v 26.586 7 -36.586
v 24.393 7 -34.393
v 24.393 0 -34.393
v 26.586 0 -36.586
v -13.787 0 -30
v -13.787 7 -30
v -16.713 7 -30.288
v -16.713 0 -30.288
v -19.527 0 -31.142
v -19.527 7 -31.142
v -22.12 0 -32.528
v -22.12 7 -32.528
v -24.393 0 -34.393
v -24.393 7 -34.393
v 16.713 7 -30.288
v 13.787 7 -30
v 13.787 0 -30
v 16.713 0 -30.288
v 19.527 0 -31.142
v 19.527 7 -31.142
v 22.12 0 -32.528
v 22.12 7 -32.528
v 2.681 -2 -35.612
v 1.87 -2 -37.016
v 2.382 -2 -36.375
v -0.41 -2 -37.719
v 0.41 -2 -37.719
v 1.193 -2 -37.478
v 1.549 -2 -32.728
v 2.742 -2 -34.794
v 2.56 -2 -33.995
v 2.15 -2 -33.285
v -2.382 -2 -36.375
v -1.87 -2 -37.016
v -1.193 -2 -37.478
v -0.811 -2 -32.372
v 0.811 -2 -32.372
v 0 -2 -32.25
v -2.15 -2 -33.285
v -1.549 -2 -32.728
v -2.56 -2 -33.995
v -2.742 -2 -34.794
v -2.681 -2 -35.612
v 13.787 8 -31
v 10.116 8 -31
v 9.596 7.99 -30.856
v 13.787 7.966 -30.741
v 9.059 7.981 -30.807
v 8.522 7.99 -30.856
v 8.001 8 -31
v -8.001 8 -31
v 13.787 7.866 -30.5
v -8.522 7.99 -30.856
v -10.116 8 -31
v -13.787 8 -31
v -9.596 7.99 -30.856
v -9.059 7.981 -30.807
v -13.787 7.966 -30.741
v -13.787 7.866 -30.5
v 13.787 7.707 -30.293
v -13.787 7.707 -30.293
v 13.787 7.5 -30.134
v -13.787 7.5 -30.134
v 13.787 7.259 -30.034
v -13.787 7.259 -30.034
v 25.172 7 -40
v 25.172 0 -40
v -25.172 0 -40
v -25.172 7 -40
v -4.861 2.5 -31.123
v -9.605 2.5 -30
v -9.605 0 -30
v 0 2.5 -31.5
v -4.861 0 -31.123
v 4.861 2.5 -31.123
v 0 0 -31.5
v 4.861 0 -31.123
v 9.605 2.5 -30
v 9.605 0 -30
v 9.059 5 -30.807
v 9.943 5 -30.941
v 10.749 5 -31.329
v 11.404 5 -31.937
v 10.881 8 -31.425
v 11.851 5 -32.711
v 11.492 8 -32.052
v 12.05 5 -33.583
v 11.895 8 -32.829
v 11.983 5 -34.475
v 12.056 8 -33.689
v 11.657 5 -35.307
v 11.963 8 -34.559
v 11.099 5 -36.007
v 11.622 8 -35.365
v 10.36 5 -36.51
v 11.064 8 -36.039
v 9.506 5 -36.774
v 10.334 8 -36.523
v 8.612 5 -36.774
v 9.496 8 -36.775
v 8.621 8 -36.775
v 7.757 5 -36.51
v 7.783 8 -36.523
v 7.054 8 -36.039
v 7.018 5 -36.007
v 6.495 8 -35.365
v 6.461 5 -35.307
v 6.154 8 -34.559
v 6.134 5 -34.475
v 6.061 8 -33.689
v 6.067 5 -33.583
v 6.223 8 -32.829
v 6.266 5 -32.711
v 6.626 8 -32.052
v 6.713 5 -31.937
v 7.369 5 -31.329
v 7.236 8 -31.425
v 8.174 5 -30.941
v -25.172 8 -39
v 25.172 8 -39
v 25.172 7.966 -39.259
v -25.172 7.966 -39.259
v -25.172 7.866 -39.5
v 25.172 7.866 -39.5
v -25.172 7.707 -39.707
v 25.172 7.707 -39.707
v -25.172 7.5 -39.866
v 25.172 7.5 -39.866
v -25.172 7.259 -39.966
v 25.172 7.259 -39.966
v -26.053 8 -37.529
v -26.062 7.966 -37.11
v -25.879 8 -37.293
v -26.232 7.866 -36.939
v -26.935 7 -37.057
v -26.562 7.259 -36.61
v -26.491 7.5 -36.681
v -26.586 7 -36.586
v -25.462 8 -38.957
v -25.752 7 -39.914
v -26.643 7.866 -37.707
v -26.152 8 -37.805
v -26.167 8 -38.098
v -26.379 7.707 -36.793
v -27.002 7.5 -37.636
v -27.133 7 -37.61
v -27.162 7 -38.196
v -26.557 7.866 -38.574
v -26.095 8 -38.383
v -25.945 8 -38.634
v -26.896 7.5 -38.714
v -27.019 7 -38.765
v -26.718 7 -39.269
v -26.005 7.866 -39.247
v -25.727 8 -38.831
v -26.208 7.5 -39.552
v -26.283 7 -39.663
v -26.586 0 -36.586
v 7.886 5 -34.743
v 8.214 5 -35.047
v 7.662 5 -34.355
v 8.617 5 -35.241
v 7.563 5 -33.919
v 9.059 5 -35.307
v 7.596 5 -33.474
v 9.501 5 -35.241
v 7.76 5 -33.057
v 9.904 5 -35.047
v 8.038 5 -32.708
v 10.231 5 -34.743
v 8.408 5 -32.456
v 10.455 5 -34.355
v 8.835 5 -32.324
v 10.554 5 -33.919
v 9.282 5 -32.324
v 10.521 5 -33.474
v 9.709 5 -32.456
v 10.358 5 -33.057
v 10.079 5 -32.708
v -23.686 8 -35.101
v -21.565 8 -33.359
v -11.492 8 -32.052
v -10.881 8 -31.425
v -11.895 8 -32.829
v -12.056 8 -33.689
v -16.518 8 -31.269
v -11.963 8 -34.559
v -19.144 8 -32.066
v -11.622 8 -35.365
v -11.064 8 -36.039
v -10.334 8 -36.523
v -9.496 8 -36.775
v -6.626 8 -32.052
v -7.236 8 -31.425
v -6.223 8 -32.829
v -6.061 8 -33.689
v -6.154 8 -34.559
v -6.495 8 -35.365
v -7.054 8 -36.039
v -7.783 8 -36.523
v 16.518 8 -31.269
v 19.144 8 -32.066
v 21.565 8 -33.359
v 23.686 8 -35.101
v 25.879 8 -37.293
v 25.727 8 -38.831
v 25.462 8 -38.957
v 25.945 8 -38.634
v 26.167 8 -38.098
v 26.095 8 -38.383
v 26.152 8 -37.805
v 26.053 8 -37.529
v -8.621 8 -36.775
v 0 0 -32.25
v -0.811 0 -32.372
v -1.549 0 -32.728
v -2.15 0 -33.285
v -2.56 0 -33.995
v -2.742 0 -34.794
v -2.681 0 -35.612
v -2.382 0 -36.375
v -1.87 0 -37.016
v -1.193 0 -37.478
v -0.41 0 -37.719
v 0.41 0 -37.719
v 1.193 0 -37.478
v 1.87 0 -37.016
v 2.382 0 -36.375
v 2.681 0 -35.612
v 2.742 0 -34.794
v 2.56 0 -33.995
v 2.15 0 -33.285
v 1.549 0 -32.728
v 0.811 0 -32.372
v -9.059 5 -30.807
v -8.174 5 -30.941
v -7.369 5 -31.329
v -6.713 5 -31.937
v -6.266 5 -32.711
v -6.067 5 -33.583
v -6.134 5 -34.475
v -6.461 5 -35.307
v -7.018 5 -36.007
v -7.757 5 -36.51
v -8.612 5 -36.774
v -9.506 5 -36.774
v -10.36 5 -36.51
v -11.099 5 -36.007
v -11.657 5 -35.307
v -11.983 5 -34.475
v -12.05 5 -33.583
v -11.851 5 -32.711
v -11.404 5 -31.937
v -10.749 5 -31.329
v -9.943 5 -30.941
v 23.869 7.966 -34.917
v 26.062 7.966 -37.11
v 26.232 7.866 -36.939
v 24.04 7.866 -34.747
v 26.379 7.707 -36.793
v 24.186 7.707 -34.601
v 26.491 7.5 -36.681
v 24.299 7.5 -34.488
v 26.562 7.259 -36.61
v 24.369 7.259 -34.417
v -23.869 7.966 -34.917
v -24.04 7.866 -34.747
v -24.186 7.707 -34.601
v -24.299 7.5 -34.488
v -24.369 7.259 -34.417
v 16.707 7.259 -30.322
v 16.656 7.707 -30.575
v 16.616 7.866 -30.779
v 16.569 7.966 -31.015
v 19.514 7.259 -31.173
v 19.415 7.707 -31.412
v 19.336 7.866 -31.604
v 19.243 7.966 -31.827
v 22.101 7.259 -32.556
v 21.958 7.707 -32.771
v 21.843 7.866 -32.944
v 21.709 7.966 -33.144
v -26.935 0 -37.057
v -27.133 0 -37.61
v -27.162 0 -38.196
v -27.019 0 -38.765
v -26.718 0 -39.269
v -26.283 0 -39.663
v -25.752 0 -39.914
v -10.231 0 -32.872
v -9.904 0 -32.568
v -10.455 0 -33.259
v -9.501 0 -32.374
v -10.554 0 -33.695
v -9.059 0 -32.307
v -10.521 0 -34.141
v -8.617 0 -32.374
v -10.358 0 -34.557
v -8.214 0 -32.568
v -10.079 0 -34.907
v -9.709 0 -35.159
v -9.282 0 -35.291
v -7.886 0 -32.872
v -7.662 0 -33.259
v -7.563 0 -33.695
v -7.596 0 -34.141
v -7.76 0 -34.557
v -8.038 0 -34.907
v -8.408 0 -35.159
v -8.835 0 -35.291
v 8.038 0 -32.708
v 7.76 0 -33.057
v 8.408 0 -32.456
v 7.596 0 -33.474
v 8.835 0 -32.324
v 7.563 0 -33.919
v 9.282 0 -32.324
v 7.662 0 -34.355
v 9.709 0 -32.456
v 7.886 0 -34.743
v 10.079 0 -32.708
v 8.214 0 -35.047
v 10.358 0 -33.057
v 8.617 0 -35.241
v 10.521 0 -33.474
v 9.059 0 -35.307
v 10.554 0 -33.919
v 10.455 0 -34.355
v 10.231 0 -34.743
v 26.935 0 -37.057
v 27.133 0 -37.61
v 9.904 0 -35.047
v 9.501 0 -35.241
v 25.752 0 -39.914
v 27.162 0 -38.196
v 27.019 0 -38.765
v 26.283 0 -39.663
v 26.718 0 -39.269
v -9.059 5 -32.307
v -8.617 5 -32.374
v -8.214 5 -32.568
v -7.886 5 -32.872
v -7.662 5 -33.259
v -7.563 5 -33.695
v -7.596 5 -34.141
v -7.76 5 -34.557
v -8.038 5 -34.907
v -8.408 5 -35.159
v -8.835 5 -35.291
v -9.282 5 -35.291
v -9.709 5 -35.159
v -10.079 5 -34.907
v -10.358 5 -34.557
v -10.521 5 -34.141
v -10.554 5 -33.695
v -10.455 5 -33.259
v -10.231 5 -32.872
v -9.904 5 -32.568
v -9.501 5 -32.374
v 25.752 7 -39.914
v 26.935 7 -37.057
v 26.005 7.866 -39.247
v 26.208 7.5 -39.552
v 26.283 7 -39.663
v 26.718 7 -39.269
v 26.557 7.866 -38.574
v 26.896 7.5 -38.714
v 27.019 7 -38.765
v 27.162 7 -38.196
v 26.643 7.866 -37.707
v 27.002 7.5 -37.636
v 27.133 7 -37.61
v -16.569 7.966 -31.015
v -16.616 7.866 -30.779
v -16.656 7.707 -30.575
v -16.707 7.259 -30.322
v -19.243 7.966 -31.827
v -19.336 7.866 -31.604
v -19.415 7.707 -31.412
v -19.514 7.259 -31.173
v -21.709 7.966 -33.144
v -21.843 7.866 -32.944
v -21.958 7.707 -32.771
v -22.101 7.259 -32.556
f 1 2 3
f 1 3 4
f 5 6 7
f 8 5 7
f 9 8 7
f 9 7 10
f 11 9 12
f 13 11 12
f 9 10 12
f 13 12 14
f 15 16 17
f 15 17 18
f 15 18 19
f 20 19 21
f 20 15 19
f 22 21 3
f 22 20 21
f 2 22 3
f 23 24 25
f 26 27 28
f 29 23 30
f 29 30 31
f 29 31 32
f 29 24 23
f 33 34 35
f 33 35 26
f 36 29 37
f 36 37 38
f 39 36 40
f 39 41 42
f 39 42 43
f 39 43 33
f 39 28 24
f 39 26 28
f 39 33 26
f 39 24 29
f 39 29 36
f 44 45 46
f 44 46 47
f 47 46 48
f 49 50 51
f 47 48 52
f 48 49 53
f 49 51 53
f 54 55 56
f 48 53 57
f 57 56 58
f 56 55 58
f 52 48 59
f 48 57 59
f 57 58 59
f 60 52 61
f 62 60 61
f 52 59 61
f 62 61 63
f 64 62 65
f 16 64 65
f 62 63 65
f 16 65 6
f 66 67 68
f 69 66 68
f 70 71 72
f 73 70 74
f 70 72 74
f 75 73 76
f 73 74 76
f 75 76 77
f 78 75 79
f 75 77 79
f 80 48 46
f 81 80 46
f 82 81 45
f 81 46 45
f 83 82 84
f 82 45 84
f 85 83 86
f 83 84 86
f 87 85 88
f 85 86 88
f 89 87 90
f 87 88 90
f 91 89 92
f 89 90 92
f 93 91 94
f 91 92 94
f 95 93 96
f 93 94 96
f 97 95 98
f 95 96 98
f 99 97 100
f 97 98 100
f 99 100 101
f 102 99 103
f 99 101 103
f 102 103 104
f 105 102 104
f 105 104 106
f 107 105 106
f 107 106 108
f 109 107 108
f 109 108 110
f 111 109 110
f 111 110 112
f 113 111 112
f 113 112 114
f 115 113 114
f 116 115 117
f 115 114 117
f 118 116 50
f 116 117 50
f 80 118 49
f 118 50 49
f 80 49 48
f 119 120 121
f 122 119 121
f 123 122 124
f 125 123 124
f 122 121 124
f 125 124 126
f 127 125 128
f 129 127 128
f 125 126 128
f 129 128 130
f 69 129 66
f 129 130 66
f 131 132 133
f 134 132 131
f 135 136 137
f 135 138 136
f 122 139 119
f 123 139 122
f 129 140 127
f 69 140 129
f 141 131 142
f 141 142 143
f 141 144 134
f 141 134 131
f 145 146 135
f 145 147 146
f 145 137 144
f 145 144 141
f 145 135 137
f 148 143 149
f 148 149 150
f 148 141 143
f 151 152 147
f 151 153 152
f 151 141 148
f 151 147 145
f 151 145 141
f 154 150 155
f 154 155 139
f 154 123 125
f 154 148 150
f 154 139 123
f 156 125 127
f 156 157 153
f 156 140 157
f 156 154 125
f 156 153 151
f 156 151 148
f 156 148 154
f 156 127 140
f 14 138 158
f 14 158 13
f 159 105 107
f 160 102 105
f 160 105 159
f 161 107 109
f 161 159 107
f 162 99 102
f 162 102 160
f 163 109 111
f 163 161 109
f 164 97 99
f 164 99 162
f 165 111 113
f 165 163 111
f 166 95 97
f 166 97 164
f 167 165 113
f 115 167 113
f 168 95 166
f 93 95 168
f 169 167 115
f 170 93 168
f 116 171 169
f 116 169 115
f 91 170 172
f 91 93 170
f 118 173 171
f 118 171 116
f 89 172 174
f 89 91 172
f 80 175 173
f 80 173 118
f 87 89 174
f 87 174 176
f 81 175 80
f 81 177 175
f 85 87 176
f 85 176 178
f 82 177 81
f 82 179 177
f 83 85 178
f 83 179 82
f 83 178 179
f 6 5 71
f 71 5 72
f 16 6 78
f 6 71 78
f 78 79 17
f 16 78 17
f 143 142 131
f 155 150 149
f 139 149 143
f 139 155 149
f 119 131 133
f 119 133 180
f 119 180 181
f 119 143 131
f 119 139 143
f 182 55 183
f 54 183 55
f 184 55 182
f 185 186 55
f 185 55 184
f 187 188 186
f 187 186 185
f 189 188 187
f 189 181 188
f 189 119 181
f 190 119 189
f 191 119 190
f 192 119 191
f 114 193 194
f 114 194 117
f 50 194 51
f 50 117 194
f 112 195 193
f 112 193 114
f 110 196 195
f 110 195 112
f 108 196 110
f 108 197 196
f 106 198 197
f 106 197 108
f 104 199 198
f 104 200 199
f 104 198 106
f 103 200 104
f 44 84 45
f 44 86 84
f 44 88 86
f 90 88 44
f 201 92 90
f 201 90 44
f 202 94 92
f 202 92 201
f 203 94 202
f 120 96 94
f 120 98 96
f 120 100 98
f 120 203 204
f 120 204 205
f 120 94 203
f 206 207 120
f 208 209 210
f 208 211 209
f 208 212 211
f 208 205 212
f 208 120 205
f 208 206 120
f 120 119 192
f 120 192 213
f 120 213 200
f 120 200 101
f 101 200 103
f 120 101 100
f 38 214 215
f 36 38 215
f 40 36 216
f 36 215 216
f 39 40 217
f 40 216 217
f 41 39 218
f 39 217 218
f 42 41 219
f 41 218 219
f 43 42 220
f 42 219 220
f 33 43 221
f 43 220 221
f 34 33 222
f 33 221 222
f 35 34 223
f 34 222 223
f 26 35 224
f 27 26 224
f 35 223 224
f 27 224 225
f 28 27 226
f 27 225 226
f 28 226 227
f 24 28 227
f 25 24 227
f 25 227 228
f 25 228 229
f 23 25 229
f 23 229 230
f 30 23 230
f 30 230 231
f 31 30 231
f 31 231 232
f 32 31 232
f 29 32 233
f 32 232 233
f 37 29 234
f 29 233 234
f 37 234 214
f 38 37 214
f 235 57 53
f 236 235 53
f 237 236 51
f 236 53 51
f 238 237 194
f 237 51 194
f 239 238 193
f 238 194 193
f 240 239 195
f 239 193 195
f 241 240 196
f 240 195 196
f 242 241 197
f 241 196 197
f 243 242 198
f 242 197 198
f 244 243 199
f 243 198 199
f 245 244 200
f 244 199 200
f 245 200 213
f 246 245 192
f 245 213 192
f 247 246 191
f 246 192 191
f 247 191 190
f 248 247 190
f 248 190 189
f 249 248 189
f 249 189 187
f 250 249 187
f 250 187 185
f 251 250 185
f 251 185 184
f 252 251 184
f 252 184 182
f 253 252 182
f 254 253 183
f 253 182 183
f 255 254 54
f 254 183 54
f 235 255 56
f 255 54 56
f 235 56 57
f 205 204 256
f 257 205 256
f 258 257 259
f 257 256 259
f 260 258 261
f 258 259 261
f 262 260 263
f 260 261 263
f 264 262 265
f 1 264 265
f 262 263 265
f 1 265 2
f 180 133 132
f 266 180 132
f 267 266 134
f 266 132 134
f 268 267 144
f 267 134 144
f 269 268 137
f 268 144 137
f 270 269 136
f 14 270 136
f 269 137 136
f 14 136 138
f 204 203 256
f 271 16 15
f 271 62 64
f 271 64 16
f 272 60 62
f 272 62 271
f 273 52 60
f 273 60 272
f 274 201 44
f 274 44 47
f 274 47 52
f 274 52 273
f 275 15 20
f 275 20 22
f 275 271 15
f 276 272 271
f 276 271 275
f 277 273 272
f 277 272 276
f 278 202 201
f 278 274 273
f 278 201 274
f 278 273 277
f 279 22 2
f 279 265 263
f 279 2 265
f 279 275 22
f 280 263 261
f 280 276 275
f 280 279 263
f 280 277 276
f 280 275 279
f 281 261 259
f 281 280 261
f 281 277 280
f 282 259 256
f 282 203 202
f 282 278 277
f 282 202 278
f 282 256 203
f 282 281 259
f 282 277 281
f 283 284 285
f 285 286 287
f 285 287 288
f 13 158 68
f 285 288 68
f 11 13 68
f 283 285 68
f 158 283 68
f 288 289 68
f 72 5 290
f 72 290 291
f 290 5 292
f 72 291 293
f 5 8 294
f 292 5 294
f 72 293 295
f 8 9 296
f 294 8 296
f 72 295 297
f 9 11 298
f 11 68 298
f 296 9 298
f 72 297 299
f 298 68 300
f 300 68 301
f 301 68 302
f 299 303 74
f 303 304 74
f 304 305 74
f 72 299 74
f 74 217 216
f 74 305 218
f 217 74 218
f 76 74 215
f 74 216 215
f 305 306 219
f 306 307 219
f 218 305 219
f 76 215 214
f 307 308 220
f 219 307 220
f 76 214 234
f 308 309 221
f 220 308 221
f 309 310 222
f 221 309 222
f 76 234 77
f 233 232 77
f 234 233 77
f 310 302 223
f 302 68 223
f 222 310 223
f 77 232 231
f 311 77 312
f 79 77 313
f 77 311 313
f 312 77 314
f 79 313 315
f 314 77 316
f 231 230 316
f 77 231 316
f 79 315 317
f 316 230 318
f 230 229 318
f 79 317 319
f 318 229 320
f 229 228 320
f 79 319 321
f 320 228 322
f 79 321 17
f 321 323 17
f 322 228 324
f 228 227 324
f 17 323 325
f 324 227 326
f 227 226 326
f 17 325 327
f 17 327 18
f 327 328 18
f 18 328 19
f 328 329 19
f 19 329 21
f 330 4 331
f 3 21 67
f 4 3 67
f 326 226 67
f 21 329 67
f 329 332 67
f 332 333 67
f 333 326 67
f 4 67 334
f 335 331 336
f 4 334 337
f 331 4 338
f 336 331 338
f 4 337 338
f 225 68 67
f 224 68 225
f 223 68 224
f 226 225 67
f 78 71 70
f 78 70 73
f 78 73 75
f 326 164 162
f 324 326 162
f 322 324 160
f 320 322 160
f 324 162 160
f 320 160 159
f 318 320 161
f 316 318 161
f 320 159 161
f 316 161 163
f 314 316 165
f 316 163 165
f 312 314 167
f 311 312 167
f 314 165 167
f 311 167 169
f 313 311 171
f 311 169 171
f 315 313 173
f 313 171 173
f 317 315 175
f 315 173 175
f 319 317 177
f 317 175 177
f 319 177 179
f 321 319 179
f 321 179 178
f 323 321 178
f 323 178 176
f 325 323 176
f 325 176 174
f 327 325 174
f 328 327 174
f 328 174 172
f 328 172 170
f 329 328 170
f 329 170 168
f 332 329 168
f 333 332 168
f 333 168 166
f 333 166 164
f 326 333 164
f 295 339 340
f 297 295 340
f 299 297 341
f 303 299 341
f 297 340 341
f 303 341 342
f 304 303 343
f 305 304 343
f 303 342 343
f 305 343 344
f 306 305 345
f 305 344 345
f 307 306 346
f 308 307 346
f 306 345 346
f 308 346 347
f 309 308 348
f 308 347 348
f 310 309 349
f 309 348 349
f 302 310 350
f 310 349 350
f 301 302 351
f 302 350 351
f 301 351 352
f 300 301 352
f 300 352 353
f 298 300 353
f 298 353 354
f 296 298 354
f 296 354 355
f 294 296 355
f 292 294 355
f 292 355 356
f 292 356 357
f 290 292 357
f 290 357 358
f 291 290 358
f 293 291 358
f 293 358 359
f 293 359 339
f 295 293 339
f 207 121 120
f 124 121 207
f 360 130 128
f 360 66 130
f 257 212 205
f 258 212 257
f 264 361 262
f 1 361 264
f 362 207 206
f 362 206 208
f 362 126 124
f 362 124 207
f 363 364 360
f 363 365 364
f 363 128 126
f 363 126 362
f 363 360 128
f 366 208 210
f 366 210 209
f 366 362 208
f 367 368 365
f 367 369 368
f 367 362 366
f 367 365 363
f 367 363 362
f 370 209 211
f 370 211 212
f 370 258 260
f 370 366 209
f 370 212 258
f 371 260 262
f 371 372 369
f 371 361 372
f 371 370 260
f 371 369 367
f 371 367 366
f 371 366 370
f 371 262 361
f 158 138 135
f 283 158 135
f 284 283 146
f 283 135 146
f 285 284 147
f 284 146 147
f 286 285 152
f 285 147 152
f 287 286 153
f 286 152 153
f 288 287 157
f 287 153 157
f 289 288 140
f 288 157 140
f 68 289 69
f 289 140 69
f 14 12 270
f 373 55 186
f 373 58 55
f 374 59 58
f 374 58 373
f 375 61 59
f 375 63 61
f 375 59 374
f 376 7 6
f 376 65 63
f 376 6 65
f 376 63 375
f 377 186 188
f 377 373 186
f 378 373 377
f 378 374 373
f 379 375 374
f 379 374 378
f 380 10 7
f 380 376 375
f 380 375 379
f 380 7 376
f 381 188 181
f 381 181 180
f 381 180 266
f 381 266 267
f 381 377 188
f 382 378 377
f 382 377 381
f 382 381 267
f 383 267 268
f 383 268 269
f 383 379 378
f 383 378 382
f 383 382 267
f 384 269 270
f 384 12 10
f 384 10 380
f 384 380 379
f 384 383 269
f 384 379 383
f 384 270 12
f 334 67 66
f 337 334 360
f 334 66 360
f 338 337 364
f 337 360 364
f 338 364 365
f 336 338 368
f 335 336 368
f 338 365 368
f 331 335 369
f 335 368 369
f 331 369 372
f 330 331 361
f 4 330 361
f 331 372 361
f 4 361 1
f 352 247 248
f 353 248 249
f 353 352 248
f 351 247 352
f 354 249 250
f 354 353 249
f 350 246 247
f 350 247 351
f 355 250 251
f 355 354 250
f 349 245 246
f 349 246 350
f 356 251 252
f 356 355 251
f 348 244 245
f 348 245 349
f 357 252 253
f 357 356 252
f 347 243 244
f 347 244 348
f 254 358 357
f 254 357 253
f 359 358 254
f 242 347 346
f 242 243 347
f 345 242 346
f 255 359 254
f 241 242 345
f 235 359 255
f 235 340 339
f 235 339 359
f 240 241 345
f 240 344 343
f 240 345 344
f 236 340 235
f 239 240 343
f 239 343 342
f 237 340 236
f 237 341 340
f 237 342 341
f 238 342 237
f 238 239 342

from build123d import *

# Parameters (mm, degrees)
EXTRUDE_1_DEPTH     = 8
SKETCH_4_R          = 31.5
CUT_EXTRUDE_1_DEPTH = 2.5
SKETCH_5_R          = 1.5
CUT_EXTRUDE_2_DEPTH = 51.635955605
SKETCH_6_R          = 3
CUT_EXTRUDE_3_DEPTH = 3
SKETCH_7_R          = 2.75
EXTRUDE_2_DEPTH     = 2
FILLET_1_R          = 15
FILLET_2_R          = 2
FILLET_3_R          = 1


with BuildPart() as part:
    # 草图3 → 凸台-拉伸1 (new body)
    with BuildSketch(Plane(origin=(0, 0, 0), x_dir=(1, 0, 0), z_dir=(0, 1, 0))):
        Polygon((-20, 30), (20, 30), (30, 40), (-30, 40), align=None)
    extrude(amount=EXTRUDE_1_DEPTH)

    # 草图4 → 切除-拉伸1 (cut)
    with BuildSketch(Plane.XZ):
        Circle(SKETCH_4_R)
    extrude(amount=-CUT_EXTRUDE_1_DEPTH, mode=Mode.SUBTRACT)

    # 草图5 → 切除-拉伸2 (cut, through all)
    with BuildSketch(Plane(origin=(0, 8, 0), x_dir=(1, 0, 0), z_dir=(0, 1, 0))):
        with Locations(Location((-9.058666579, 33.80740392, 0), (0, 0, 270))):
            Circle(SKETCH_5_R)
        with Locations(Location((9.058666579, 33.80740392, 0), (0, 0, 90))):
            Circle(SKETCH_5_R)
    extrude(amount=-CUT_EXTRUDE_2_DEPTH, mode=Mode.SUBTRACT)

    # 草图6 → 切除-拉伸3 (cut)
    with BuildSketch(Plane(origin=(0, 8, 0), x_dir=(1, 0, 0), z_dir=(0, 1, 0))):
        with Locations(Location((-9.058666579, 33.80740392, 0), (0, 0, 270))):
            Circle(SKETCH_6_R)
        with Locations(Location((9.058666579, 33.80740392, 0), (0, 0, 270))):
            Circle(SKETCH_6_R)
    extrude(amount=-CUT_EXTRUDE_3_DEPTH, mode=Mode.SUBTRACT)

    # 草图7 → 凸台-拉伸2 (add)
    with BuildSketch(Plane.XZ):
        with Locations(Location((0, -35, 0), (0, 0, 90))):
            Circle(SKETCH_7_R)
    extrude(amount=EXTRUDE_2_DEPTH)

    # 圆角1
    fillet_1_edges = [part.edges().sort_by_distance(p)[0] for p in [
        (20, 4, -30),
        (-20, 4, -30),
    ]]
    fillet(fillet_1_edges, radius=FILLET_1_R)

    # 圆角2
    fillet_2_edges = [part.edges().sort_by_distance(p)[0] for p in [
        (-30, 4, -40),
        (30, 4, -40),
    ]]
    fillet(fillet_2_edges, radius=FILLET_2_R)

    # 圆角3
    # the kernel refuses this fillet: 1 mm, written as the material it takes off along each edge
    with BuildSketch(Plane(origin=(24.393398282, 8, -34.393398282), x_dir=(0, -1, 0), z_dir=(0.7071067811865472, 0, -0.7071067811865478)), Plane(origin=(-26.585786438, 8, -36.585786438), x_dir=(0, -1, 0), z_dir=(0.7071067811865472, 0, 0.7071067811865478))) as fillet_3_piece_1:
        with BuildLine():
            CenterArc((FILLET_3_R, FILLET_3_R), FILLET_3_R, 180, 90)
            Line((0, FILLET_3_R), (0, 0))
            Line((0, 0), (FILLET_3_R, 0))
        make_face()
    extrude(amount=3.100505063, mode=Mode.SUBTRACT)
    with BuildSketch(Plane(origin=(-13.786796564, 8, -30), x_dir=(0, -1, 0), z_dir=(1, 0, 0))) as fillet_3_piece_2:
        with BuildLine():
            CenterArc((FILLET_3_R, FILLET_3_R), FILLET_3_R, 180, 90)
            Line((0, FILLET_3_R), (0, 0))
            Line((0, 0), (FILLET_3_R, 0))
        make_face()
    extrude(amount=27.573593129, mode=Mode.SUBTRACT)
    with BuildSketch(Plane(origin=(-13.786796564, 8, -45), x_dir=(0, 0, 1), z_dir=(1, 0, 0))) as fillet_3_piece_3:
        with BuildLine():
            CenterArc((15 - FILLET_3_R, FILLET_3_R), FILLET_3_R, 270, 90)
            Line((15 - FILLET_3_R, 0), (15, 0))
            Line((15, 0), (15, FILLET_3_R))
        make_face()
    revolve(axis=Axis((-13.786796564, 8, -45), (0, -1, 0)), revolution_arc=45, mode=Mode.SUBTRACT)
    with BuildSketch(Plane(origin=(13.786796564, 8, -45), x_dir=(0, 0, 1), z_dir=(-1, 0, 0))) as fillet_3_piece_4:
        with BuildLine():
            CenterArc((15 - FILLET_3_R, -FILLET_3_R), FILLET_3_R, 0, 90)
            Line((15 - FILLET_3_R, 0), (15, 0))
            Line((15, 0), (15, -FILLET_3_R))
        make_face()
    revolve(axis=Axis((13.786796564, 8, -45), (0, 1, 0)), revolution_arc=45, mode=Mode.SUBTRACT)
    with BuildSketch(Plane(origin=(25.171572875, 8, -40), x_dir=(0, -1, 0), z_dir=(-1, 0, 0))) as fillet_3_piece_5:
        with BuildLine():
            CenterArc((FILLET_3_R, FILLET_3_R), FILLET_3_R, 180, 90)
            Line((0, FILLET_3_R), (0, 0))
            Line((0, 0), (FILLET_3_R, 0))
        make_face()
    extrude(amount=50.343145751, mode=Mode.SUBTRACT)
    with BuildSketch(Plane(origin=(-25.171572875, 8, -38), x_dir=(-0.7071067811865458, 0, 0.7071067811865493), z_dir=(0.7071067811865493, 0, 0.7071067811865458))) as fillet_3_piece_6:
        with BuildLine():
            CenterArc((2 - FILLET_3_R, FILLET_3_R), FILLET_3_R, 270, 90)
            Line((2 - FILLET_3_R, 0), (2, 0))
            Line((2, 0), (2, FILLET_3_R))
        make_face()
    revolve(axis=Axis((-25.171572875, 8, -38), (0, -1, 0)), revolution_arc=135, mode=Mode.SUBTRACT)
    with BuildSketch(Plane(origin=(25.171572875, 8, -38), x_dir=(0, 0, -1), z_dir=(-1, 0, 0))) as fillet_3_piece_7:
        with BuildLine():
            CenterArc((2 - FILLET_3_R, FILLET_3_R), FILLET_3_R, 270, 90)
            Line((2 - FILLET_3_R, 0), (2, 0))
            Line((2, 0), (2, FILLET_3_R))
        make_face()
    revolve(axis=Axis((25.171572875, 8, -38), (0, -1, 0)), revolution_arc=135, mode=Mode.SUBTRACT)


solid = part.part
